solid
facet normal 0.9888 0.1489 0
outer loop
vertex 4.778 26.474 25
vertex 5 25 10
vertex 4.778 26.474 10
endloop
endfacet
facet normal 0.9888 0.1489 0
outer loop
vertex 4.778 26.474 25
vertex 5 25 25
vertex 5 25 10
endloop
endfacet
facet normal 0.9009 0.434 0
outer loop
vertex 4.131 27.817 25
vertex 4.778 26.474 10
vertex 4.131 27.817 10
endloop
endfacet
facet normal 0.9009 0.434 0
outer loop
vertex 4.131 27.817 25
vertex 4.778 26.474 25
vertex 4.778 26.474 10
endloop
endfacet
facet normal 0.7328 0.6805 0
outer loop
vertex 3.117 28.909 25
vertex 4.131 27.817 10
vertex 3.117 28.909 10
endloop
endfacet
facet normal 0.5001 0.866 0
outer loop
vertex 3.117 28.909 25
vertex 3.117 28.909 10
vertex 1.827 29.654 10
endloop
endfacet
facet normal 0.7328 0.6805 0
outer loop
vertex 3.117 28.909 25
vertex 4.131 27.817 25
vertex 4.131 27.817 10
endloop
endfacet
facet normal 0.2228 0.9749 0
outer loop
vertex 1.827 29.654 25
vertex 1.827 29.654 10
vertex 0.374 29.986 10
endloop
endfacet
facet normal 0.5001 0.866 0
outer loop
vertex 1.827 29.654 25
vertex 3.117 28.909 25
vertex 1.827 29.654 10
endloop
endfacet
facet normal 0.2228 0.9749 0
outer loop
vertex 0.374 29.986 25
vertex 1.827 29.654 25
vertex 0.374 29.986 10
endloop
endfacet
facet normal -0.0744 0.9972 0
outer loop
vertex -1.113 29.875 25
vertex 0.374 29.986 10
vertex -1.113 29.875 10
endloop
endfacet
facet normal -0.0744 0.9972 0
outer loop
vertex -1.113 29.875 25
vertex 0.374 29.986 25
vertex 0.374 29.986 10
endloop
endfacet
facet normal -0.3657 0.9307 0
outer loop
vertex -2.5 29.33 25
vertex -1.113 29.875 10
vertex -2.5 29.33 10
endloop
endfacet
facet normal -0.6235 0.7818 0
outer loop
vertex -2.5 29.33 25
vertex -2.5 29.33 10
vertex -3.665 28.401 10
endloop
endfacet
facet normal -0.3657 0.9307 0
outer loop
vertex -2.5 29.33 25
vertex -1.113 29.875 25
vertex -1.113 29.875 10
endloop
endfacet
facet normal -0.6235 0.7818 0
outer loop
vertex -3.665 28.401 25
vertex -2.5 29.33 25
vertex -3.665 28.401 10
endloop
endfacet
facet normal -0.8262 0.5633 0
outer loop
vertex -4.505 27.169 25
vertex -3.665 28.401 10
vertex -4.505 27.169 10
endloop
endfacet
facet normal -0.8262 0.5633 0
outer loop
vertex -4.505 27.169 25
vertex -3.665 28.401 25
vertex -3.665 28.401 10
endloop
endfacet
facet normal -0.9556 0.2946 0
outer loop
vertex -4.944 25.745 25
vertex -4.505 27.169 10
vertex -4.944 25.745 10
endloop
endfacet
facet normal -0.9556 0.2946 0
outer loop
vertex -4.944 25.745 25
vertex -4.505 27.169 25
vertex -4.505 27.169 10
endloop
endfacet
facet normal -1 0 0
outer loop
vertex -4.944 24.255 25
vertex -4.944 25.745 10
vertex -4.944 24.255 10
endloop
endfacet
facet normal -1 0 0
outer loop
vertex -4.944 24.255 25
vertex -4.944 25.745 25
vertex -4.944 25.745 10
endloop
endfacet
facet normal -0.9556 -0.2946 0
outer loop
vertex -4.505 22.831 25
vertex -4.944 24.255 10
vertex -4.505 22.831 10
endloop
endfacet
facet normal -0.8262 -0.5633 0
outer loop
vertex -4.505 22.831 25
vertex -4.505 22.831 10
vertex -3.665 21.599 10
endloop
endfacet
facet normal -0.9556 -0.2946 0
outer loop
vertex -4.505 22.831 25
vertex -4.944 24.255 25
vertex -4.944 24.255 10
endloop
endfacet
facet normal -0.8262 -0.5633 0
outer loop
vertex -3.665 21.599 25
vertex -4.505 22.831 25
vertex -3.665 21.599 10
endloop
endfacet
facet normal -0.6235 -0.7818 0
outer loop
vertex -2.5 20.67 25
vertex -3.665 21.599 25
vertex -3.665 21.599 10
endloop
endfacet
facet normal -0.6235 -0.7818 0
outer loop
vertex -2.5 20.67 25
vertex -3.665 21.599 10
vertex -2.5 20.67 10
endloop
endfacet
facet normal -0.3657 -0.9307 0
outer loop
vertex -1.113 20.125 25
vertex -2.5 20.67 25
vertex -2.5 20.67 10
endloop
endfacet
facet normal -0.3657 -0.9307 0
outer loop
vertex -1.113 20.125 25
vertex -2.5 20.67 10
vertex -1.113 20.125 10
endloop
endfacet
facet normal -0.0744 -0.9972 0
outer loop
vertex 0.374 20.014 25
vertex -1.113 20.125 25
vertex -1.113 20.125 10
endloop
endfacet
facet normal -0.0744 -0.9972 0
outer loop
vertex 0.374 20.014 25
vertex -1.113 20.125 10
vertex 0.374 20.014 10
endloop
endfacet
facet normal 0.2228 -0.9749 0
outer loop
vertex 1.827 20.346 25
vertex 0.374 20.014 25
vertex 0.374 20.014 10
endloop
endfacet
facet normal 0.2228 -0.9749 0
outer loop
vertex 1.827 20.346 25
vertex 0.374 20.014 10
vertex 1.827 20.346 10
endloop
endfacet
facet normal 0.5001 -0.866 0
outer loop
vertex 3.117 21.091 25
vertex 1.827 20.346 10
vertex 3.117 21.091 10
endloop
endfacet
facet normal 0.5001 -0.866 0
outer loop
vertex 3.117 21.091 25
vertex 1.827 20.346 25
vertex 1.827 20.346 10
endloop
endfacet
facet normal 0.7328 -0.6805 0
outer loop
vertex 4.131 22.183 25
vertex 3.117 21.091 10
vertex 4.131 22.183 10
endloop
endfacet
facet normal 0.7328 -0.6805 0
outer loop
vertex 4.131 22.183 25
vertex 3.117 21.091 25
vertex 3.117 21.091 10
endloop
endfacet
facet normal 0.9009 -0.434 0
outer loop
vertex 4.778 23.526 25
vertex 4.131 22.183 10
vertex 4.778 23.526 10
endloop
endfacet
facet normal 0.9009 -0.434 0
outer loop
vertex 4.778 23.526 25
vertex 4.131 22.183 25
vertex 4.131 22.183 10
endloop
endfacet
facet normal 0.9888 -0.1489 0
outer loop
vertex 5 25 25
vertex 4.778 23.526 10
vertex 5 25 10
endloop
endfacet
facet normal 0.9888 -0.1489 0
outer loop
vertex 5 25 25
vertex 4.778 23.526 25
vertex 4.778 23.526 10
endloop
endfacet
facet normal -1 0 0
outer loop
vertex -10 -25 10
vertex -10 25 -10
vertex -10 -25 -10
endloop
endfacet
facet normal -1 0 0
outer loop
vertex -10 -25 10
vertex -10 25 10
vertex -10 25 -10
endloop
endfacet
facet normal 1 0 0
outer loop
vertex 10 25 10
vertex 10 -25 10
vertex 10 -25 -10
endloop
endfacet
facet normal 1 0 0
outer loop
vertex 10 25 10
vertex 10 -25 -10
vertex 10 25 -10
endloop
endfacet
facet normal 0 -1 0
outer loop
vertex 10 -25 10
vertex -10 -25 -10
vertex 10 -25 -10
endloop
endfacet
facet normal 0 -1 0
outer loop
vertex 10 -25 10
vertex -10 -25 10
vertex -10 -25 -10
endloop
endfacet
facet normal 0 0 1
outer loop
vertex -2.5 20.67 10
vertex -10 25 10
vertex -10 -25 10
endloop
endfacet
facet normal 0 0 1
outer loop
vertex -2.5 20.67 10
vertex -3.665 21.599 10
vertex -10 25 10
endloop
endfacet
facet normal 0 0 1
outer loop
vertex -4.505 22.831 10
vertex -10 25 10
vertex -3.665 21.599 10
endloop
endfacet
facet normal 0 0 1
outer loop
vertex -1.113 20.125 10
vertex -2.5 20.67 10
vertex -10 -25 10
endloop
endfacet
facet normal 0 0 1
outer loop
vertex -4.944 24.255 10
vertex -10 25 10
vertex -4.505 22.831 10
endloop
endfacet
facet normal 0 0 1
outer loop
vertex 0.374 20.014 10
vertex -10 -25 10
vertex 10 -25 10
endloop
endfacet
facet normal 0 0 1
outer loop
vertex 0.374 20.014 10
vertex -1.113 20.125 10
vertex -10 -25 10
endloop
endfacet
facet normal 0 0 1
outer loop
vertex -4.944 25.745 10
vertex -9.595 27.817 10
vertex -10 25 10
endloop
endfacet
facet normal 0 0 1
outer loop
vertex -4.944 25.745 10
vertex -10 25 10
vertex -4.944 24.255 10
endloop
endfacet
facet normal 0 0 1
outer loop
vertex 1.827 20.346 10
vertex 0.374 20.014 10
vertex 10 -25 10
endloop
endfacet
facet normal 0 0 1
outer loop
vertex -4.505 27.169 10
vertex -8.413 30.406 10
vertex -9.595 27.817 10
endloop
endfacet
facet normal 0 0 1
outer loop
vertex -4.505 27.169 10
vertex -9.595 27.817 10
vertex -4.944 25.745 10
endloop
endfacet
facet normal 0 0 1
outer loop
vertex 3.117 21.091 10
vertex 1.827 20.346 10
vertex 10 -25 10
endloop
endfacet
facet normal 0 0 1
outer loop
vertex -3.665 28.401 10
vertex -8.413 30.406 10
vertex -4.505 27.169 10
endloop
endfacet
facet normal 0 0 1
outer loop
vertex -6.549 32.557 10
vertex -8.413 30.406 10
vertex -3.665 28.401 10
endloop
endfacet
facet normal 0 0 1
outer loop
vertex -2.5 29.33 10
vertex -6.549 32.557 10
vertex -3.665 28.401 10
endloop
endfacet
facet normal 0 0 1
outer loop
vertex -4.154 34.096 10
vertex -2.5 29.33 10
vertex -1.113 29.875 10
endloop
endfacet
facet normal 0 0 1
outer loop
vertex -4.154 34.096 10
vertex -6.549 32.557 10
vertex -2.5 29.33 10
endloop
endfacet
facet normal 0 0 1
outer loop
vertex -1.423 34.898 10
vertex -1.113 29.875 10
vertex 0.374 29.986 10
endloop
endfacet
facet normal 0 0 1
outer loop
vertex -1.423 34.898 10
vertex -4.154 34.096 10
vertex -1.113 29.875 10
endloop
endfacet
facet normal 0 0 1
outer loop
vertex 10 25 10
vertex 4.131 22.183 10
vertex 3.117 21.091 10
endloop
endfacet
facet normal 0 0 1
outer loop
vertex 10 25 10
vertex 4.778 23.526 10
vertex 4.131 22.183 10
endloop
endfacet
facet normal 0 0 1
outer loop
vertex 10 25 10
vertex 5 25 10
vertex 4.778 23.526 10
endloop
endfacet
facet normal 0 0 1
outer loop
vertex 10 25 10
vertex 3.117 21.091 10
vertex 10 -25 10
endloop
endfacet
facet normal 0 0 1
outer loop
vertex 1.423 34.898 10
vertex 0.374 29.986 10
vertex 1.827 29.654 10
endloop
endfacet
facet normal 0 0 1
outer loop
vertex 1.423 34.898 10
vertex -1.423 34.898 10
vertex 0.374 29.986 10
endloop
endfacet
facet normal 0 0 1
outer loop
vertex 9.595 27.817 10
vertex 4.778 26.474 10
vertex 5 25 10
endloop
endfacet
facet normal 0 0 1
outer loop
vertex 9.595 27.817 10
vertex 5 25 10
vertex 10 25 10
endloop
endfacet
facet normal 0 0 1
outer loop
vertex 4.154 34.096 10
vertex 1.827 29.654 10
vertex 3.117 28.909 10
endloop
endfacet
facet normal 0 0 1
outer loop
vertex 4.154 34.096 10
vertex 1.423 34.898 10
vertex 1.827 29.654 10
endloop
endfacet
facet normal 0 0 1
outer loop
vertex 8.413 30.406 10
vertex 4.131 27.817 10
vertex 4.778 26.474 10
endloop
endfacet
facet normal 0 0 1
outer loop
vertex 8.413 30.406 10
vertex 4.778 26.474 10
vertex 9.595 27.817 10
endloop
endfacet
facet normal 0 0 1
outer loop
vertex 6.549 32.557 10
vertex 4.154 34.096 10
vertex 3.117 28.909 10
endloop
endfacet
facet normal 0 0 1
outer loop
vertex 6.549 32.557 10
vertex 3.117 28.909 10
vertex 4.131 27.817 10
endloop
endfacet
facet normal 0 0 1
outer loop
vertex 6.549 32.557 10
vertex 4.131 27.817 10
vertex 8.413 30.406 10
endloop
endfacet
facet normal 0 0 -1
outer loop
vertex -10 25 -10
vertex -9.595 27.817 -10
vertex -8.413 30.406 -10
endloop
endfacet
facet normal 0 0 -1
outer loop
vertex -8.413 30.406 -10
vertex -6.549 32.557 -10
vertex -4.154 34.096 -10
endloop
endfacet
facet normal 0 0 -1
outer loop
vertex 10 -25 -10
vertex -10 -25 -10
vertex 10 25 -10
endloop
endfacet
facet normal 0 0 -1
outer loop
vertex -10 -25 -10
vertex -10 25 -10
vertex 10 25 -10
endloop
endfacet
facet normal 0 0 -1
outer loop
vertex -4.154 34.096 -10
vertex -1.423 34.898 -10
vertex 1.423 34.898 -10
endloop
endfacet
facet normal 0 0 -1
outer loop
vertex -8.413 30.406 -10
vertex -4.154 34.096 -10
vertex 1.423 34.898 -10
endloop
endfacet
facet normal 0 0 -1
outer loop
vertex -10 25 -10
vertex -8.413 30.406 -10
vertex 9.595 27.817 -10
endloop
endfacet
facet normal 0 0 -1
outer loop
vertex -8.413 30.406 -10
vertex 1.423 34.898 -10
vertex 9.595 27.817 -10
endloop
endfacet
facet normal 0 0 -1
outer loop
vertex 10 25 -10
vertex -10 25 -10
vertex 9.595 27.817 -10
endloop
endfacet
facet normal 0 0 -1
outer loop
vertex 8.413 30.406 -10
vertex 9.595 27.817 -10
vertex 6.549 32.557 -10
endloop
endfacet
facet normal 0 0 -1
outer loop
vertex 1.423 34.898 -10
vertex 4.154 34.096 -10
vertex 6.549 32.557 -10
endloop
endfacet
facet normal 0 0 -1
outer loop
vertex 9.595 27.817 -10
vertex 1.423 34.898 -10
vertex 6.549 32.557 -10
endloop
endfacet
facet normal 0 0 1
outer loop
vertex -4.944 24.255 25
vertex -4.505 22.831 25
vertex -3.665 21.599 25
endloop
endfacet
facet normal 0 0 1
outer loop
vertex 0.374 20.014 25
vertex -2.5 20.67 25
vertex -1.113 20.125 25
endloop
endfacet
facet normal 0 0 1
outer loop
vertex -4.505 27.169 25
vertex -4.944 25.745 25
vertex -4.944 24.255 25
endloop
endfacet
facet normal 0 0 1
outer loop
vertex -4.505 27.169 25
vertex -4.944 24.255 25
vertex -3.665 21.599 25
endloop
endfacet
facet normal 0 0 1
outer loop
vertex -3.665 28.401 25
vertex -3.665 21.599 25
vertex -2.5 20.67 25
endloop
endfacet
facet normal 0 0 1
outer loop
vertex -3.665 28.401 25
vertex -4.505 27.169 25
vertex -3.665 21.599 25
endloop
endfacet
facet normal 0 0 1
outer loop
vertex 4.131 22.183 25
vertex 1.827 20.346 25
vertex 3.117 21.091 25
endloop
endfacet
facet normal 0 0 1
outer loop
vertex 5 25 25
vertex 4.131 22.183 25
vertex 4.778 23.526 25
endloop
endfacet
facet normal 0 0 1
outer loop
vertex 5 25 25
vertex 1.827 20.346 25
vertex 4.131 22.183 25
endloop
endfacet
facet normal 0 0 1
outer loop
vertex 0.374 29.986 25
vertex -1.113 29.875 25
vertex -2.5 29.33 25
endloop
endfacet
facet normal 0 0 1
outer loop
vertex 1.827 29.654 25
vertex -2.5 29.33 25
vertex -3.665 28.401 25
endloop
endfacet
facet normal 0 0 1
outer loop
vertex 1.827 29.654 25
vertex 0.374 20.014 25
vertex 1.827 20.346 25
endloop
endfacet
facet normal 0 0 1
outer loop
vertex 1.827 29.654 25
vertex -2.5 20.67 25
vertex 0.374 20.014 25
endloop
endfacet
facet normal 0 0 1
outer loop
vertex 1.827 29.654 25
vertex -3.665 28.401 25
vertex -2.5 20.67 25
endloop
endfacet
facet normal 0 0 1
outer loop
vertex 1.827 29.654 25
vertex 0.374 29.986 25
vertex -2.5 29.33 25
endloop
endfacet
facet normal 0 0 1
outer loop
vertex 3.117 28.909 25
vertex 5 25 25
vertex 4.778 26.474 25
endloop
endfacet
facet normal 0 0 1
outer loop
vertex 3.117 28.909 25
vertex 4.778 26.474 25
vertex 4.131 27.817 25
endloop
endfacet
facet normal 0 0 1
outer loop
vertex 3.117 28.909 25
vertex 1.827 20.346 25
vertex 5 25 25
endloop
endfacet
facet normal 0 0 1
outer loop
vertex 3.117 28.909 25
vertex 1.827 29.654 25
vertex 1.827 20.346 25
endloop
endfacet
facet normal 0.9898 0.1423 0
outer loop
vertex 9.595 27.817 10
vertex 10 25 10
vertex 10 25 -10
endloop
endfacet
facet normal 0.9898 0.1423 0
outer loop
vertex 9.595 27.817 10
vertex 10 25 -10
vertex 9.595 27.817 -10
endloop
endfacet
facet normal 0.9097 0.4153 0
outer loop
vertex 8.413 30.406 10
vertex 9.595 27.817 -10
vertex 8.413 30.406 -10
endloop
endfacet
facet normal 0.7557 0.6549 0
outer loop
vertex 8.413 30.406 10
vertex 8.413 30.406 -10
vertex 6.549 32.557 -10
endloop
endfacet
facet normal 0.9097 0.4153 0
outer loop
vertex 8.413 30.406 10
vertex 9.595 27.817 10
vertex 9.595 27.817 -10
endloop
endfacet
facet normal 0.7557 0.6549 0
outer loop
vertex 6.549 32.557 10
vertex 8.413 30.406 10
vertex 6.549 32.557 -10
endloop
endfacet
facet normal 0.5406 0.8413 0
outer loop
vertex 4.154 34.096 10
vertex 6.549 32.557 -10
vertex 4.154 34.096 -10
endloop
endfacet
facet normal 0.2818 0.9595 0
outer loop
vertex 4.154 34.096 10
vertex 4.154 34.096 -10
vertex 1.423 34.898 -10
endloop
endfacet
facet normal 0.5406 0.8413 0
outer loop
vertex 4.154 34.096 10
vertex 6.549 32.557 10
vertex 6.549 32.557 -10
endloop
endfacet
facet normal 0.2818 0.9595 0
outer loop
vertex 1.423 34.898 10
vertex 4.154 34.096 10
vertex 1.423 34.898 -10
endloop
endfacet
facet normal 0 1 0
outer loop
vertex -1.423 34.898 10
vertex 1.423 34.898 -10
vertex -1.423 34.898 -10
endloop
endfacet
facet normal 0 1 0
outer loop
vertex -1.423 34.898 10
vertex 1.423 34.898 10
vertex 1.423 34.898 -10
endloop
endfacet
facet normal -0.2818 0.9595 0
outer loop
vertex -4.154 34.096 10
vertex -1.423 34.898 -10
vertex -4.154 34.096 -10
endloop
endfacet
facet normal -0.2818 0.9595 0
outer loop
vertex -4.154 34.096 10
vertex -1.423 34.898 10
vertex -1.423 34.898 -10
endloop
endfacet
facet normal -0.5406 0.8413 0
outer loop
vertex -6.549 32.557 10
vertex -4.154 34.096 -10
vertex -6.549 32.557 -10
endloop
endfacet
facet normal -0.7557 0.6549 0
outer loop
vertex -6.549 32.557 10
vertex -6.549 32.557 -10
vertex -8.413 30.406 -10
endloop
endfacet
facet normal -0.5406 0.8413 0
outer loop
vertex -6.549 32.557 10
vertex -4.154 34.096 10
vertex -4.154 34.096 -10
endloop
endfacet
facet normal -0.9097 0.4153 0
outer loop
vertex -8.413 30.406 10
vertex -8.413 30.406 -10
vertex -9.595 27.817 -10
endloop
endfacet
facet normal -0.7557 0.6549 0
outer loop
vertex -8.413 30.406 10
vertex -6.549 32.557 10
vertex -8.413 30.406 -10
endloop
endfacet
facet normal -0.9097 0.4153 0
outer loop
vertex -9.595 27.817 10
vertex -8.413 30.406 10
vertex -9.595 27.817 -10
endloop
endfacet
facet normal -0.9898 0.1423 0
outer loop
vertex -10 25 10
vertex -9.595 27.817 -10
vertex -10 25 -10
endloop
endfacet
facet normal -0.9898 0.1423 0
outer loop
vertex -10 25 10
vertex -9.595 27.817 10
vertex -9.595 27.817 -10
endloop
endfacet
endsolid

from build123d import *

# Parameters (mm, degrees)
F0_R      = 5
F1_DEPTH  = 10
F2_R      = 5
F3_DEPTH  = 25
F3_FACE_R = 5
F4_DEPTH  = 15


with BuildPart() as f1:
    # F0 (on Top) → F1 (new body, symmetric)
    with BuildSketch(Plane.XY):
        with BuildLine():
            Line((-10, -25), (10, -25))
            Line((10, -25), (10, 25))
            ThreePointArc((10, 25), (0, 35), (-10, 25))
            Line((-10, 25), (-10, -25))
        make_face()
        with Locations((0, 25)):
            Circle(F0_R, mode=Mode.SUBTRACT)
    extrude(amount=F1_DEPTH, both=True)

    # F2 (on Top) → F3 (join, symmetric)
    with BuildSketch(Plane.XY):
        with Locations((0, 25)):
            Circle(F2_R)
    extrude(amount=F3_DEPTH, both=True)

    # F3_face (on face) → F4 (cut)
    with BuildSketch(Plane(origin=(0, 25, -25), x_dir=(1, 0, 0), z_dir=(0, 0, -1))):
        Circle(F3_FACE_R)
    extrude(amount=-F4_DEPTH, mode=Mode.SUBTRACT)


solid = f1.part
